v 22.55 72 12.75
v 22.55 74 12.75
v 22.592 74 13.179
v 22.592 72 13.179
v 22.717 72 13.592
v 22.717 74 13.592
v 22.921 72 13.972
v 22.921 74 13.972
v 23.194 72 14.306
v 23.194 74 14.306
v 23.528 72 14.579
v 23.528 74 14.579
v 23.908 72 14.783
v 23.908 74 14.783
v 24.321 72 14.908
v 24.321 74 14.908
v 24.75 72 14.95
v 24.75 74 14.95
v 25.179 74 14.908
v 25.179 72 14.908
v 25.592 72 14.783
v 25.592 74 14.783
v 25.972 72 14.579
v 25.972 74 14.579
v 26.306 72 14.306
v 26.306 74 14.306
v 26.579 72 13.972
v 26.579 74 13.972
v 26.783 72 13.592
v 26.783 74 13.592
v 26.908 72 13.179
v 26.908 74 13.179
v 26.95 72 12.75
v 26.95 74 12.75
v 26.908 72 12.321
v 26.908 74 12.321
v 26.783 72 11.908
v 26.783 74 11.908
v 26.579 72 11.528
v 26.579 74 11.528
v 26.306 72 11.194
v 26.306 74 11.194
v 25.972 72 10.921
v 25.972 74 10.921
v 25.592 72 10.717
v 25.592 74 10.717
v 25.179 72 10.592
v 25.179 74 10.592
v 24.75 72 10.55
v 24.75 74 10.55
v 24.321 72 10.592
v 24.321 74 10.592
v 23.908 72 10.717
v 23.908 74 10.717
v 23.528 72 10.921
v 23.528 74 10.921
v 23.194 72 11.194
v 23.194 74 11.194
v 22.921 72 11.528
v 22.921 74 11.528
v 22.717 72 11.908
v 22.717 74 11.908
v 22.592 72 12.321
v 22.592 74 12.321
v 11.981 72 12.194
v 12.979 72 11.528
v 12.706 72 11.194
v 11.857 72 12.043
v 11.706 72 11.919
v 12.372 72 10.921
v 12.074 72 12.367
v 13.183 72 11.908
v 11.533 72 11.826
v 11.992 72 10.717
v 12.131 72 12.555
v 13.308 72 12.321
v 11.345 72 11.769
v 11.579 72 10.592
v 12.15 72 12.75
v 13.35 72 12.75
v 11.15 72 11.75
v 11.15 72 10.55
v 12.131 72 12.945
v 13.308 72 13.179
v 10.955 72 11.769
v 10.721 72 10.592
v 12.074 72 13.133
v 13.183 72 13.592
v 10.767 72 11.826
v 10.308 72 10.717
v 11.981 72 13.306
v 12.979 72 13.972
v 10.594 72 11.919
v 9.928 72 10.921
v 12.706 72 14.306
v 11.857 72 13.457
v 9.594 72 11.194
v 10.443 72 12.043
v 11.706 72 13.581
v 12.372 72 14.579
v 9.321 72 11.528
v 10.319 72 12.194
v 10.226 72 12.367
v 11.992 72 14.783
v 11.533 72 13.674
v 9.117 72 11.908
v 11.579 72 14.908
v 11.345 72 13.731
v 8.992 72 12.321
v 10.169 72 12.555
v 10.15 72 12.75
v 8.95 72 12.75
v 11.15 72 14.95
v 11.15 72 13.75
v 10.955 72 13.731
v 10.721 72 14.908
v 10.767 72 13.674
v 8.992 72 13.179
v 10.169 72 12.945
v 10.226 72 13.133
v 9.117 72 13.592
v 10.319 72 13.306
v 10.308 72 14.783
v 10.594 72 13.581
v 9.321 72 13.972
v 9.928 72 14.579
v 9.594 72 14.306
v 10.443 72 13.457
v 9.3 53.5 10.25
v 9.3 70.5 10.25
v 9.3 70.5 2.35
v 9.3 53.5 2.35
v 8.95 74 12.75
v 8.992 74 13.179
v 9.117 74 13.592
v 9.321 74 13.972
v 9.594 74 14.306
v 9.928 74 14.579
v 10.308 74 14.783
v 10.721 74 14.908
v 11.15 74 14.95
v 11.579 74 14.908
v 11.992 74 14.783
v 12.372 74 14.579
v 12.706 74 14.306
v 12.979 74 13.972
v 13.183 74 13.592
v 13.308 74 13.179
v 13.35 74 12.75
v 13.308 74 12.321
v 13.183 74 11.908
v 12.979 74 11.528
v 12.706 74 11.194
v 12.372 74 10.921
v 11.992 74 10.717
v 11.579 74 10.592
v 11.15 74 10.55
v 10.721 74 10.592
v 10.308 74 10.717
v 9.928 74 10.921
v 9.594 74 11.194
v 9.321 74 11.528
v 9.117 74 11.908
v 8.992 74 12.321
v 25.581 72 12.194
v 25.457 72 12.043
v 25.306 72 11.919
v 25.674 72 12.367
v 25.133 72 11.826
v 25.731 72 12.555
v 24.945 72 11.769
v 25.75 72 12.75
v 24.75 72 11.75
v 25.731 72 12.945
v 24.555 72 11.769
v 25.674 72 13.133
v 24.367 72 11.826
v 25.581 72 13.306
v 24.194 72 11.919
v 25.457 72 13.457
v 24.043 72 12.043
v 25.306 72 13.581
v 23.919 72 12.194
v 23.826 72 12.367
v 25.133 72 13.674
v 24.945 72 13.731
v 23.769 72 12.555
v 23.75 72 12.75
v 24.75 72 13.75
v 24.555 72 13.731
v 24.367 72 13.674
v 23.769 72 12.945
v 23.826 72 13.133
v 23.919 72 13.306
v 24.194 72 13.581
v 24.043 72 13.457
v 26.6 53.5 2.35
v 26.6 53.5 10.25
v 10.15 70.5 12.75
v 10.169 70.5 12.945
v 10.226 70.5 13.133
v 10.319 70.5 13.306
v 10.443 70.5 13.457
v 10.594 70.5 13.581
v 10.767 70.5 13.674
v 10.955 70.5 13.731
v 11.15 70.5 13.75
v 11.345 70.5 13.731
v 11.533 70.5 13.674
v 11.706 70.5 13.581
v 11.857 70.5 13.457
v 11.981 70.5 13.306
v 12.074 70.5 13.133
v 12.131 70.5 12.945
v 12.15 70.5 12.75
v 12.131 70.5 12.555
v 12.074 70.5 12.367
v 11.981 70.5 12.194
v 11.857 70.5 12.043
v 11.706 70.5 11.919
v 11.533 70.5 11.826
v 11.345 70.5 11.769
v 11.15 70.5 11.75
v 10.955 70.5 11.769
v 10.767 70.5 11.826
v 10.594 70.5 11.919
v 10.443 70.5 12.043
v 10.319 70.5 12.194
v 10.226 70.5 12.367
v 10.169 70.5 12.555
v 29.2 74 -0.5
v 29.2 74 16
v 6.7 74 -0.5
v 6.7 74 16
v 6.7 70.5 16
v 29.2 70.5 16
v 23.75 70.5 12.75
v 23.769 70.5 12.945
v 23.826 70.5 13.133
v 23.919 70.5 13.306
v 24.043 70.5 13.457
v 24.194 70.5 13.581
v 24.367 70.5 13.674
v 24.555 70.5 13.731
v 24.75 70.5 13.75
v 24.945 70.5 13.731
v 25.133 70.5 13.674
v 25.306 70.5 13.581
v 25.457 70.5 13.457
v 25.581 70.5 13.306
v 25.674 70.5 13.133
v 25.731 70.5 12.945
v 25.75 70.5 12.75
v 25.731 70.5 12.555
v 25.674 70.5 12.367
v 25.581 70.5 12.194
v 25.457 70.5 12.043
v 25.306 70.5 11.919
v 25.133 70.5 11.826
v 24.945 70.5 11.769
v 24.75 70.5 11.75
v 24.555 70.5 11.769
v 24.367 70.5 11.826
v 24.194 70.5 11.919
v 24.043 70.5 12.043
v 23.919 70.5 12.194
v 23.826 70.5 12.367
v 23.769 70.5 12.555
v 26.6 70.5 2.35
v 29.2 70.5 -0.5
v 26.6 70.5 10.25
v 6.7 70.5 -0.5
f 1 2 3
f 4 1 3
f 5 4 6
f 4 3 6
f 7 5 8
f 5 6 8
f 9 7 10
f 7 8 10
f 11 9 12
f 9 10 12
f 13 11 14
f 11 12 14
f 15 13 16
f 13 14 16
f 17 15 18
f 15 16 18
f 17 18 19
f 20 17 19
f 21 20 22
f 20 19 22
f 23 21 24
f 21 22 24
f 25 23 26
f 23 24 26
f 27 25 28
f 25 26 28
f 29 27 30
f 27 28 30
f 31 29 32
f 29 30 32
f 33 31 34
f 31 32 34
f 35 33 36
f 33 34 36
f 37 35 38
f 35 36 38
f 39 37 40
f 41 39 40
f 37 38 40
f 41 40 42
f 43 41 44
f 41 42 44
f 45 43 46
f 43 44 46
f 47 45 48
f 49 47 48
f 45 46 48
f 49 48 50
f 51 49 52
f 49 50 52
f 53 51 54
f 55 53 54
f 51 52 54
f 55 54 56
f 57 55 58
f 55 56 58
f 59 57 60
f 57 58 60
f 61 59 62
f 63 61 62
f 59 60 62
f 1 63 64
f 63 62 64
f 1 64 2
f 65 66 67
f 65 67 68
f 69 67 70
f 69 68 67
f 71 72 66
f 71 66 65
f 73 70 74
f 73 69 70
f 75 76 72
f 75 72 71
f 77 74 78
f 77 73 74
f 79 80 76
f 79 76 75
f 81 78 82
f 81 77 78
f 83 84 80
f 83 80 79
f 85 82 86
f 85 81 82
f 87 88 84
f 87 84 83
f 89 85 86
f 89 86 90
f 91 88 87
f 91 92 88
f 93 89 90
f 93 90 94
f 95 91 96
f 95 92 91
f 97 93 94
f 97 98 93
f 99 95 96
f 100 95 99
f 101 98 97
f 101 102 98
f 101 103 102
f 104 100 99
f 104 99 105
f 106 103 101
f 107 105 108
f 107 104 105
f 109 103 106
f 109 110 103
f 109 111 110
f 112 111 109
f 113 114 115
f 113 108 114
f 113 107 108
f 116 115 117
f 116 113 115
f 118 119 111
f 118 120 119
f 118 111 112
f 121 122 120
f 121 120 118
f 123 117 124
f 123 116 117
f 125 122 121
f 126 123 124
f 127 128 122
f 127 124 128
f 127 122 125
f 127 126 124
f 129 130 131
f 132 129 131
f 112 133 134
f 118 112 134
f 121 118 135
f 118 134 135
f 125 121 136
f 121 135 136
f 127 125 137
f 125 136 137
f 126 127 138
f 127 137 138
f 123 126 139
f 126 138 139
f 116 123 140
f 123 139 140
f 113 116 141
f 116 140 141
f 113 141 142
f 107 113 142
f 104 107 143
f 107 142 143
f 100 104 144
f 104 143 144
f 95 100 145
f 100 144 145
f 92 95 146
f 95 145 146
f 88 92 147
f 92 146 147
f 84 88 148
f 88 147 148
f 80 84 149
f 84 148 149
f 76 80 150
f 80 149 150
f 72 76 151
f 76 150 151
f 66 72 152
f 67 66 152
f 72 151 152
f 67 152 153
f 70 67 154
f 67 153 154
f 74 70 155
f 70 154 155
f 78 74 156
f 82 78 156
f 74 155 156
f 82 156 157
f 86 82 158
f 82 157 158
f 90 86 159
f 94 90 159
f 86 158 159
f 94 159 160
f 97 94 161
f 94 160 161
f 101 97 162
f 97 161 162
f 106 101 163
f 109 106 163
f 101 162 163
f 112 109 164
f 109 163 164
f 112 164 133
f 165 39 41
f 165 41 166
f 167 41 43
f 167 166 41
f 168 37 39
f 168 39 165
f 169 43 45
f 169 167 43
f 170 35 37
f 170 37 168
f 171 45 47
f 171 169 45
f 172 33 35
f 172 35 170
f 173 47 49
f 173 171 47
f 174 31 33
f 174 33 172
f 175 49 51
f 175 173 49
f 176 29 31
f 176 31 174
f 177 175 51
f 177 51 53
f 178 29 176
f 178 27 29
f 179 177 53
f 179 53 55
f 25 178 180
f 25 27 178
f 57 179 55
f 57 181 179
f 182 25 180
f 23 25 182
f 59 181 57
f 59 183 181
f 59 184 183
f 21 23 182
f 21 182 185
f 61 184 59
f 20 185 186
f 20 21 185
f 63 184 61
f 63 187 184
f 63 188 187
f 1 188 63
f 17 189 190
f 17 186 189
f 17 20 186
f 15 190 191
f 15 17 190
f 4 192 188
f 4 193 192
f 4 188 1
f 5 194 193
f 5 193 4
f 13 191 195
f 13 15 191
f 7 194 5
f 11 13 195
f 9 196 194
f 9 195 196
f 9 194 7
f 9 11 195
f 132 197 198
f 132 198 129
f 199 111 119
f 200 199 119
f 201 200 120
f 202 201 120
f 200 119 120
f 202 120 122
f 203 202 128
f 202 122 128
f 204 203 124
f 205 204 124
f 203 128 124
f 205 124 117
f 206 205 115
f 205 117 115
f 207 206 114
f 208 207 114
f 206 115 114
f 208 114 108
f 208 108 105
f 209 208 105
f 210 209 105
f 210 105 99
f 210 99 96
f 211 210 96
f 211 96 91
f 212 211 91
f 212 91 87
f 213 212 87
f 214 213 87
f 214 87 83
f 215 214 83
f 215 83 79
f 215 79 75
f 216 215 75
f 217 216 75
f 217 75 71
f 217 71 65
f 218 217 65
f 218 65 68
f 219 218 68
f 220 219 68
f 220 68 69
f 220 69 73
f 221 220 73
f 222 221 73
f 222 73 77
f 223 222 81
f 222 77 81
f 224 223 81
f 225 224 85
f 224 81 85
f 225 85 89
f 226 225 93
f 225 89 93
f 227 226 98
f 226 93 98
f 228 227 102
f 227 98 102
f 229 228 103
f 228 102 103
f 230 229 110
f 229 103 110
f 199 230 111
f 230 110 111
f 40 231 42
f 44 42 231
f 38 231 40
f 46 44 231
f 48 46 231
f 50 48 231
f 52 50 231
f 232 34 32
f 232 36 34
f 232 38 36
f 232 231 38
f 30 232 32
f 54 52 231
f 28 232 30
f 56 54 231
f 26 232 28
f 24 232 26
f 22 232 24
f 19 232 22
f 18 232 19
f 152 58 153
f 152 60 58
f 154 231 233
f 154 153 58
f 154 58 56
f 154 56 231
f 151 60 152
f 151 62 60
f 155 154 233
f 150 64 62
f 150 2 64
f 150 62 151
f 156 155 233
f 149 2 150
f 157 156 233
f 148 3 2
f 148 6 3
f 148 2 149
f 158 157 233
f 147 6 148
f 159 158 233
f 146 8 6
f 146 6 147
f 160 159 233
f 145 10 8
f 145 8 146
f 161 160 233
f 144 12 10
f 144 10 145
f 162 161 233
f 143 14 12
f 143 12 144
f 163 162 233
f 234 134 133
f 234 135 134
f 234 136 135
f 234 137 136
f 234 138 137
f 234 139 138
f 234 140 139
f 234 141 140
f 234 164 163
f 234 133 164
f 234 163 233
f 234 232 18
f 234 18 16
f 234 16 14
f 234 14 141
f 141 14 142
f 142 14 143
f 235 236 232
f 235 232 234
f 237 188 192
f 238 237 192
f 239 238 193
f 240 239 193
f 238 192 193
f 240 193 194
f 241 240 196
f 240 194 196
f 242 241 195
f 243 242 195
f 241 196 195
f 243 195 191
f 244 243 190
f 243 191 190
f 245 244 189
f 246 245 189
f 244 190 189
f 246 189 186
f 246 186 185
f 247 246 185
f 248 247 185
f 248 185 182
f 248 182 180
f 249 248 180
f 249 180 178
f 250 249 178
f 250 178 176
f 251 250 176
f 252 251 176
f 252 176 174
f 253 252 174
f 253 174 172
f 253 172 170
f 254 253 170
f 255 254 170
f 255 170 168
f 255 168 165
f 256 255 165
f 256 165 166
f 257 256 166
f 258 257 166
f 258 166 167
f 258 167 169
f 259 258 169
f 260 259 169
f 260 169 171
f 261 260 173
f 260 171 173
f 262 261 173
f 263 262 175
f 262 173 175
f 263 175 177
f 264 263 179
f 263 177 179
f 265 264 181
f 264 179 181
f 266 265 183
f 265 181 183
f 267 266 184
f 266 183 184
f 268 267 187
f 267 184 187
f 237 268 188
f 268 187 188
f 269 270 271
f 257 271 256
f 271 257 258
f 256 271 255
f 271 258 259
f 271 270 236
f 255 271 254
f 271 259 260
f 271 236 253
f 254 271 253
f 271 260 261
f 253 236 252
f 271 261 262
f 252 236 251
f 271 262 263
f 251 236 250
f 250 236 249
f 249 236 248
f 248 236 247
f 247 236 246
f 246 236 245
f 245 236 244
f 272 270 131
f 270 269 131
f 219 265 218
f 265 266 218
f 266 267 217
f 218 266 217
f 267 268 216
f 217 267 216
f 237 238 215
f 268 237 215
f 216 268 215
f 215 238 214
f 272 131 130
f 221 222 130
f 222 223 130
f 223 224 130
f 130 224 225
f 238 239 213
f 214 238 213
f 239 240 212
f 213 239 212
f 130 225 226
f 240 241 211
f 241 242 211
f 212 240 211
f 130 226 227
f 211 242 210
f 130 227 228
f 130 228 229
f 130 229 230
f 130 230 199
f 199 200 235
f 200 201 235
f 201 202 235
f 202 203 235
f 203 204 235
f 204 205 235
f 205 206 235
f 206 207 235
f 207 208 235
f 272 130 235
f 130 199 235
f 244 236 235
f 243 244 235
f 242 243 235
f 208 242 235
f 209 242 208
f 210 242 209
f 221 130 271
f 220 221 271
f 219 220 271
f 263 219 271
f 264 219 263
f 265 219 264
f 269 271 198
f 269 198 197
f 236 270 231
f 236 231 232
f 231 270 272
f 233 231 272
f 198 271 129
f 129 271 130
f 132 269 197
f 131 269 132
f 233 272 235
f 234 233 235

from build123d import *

# Parameters (mm, degrees)
SKETCH025_W             = 22.5
SKETCH025_H             = 16.5
PAD012_DEPTH            = 3.5
SKETCH026_R             = 2.2
POCKET009_DEPTH         = 2
SKETCH027_R             = 1
POCKET010_DEPTH         = 3.501
SKETCH028_W             = 17.3
SKETCH028_H             = 7.9
PAD013_DEPTH            = 17
BODY003_PLACEMENT_ANGLE = 180


with BuildPart() as part:
    # Sketch025 → Pad012 (new body)
    with BuildSketch(Plane.XZ):
        with Locations((11.25, 8.25)):
            Rectangle(SKETCH025_W, SKETCH025_H)
    extrude(amount=PAD012_DEPTH)

    # Sketch026 (on Face6 of Pad012) → Pocket009 (cut)
    with BuildSketch(Plane.XZ.offset(3.5)):
        with Locations((4.45, 13.25)):
            Circle(SKETCH026_R)
        with Locations((18.05, 13.25)):
            Circle(SKETCH026_R)
    extrude(amount=-POCKET009_DEPTH, mode=Mode.SUBTRACT)

    # Sketch027 (on Face5 of Pocket009) → Pocket010 (cut, through all)
    with BuildSketch(Plane.XZ.offset(3.5)):
        with Locations((4.45, 13.25)):
            Circle(SKETCH027_R)
        with Locations((18.05, 13.25)):
            Circle(SKETCH027_R)
    extrude(amount=-POCKET010_DEPTH, mode=Mode.SUBTRACT)

    # Sketch028 (on Face4 of Pocket010) → Pad013 (join)
    with BuildSketch(Plane(origin=(0, 0, 0), x_dir=(1, 0, 0), z_dir=(0, 1, 0))):
        with Locations((11.25, -6.8)):
            Rectangle(SKETCH028_W, SKETCH028_H)
    extrude(amount=PAD013_DEPTH)


with BuildPart() as part_1:
    # Body003 placement: moved
    add(part.part.moved(Location((29.2, 70.5, -0.5))).rotate(Axis((29.2, 70.5, -0.5), (0, 0, 1)), BODY003_PLACEMENT_ANGLE))


solid = part_1.part
